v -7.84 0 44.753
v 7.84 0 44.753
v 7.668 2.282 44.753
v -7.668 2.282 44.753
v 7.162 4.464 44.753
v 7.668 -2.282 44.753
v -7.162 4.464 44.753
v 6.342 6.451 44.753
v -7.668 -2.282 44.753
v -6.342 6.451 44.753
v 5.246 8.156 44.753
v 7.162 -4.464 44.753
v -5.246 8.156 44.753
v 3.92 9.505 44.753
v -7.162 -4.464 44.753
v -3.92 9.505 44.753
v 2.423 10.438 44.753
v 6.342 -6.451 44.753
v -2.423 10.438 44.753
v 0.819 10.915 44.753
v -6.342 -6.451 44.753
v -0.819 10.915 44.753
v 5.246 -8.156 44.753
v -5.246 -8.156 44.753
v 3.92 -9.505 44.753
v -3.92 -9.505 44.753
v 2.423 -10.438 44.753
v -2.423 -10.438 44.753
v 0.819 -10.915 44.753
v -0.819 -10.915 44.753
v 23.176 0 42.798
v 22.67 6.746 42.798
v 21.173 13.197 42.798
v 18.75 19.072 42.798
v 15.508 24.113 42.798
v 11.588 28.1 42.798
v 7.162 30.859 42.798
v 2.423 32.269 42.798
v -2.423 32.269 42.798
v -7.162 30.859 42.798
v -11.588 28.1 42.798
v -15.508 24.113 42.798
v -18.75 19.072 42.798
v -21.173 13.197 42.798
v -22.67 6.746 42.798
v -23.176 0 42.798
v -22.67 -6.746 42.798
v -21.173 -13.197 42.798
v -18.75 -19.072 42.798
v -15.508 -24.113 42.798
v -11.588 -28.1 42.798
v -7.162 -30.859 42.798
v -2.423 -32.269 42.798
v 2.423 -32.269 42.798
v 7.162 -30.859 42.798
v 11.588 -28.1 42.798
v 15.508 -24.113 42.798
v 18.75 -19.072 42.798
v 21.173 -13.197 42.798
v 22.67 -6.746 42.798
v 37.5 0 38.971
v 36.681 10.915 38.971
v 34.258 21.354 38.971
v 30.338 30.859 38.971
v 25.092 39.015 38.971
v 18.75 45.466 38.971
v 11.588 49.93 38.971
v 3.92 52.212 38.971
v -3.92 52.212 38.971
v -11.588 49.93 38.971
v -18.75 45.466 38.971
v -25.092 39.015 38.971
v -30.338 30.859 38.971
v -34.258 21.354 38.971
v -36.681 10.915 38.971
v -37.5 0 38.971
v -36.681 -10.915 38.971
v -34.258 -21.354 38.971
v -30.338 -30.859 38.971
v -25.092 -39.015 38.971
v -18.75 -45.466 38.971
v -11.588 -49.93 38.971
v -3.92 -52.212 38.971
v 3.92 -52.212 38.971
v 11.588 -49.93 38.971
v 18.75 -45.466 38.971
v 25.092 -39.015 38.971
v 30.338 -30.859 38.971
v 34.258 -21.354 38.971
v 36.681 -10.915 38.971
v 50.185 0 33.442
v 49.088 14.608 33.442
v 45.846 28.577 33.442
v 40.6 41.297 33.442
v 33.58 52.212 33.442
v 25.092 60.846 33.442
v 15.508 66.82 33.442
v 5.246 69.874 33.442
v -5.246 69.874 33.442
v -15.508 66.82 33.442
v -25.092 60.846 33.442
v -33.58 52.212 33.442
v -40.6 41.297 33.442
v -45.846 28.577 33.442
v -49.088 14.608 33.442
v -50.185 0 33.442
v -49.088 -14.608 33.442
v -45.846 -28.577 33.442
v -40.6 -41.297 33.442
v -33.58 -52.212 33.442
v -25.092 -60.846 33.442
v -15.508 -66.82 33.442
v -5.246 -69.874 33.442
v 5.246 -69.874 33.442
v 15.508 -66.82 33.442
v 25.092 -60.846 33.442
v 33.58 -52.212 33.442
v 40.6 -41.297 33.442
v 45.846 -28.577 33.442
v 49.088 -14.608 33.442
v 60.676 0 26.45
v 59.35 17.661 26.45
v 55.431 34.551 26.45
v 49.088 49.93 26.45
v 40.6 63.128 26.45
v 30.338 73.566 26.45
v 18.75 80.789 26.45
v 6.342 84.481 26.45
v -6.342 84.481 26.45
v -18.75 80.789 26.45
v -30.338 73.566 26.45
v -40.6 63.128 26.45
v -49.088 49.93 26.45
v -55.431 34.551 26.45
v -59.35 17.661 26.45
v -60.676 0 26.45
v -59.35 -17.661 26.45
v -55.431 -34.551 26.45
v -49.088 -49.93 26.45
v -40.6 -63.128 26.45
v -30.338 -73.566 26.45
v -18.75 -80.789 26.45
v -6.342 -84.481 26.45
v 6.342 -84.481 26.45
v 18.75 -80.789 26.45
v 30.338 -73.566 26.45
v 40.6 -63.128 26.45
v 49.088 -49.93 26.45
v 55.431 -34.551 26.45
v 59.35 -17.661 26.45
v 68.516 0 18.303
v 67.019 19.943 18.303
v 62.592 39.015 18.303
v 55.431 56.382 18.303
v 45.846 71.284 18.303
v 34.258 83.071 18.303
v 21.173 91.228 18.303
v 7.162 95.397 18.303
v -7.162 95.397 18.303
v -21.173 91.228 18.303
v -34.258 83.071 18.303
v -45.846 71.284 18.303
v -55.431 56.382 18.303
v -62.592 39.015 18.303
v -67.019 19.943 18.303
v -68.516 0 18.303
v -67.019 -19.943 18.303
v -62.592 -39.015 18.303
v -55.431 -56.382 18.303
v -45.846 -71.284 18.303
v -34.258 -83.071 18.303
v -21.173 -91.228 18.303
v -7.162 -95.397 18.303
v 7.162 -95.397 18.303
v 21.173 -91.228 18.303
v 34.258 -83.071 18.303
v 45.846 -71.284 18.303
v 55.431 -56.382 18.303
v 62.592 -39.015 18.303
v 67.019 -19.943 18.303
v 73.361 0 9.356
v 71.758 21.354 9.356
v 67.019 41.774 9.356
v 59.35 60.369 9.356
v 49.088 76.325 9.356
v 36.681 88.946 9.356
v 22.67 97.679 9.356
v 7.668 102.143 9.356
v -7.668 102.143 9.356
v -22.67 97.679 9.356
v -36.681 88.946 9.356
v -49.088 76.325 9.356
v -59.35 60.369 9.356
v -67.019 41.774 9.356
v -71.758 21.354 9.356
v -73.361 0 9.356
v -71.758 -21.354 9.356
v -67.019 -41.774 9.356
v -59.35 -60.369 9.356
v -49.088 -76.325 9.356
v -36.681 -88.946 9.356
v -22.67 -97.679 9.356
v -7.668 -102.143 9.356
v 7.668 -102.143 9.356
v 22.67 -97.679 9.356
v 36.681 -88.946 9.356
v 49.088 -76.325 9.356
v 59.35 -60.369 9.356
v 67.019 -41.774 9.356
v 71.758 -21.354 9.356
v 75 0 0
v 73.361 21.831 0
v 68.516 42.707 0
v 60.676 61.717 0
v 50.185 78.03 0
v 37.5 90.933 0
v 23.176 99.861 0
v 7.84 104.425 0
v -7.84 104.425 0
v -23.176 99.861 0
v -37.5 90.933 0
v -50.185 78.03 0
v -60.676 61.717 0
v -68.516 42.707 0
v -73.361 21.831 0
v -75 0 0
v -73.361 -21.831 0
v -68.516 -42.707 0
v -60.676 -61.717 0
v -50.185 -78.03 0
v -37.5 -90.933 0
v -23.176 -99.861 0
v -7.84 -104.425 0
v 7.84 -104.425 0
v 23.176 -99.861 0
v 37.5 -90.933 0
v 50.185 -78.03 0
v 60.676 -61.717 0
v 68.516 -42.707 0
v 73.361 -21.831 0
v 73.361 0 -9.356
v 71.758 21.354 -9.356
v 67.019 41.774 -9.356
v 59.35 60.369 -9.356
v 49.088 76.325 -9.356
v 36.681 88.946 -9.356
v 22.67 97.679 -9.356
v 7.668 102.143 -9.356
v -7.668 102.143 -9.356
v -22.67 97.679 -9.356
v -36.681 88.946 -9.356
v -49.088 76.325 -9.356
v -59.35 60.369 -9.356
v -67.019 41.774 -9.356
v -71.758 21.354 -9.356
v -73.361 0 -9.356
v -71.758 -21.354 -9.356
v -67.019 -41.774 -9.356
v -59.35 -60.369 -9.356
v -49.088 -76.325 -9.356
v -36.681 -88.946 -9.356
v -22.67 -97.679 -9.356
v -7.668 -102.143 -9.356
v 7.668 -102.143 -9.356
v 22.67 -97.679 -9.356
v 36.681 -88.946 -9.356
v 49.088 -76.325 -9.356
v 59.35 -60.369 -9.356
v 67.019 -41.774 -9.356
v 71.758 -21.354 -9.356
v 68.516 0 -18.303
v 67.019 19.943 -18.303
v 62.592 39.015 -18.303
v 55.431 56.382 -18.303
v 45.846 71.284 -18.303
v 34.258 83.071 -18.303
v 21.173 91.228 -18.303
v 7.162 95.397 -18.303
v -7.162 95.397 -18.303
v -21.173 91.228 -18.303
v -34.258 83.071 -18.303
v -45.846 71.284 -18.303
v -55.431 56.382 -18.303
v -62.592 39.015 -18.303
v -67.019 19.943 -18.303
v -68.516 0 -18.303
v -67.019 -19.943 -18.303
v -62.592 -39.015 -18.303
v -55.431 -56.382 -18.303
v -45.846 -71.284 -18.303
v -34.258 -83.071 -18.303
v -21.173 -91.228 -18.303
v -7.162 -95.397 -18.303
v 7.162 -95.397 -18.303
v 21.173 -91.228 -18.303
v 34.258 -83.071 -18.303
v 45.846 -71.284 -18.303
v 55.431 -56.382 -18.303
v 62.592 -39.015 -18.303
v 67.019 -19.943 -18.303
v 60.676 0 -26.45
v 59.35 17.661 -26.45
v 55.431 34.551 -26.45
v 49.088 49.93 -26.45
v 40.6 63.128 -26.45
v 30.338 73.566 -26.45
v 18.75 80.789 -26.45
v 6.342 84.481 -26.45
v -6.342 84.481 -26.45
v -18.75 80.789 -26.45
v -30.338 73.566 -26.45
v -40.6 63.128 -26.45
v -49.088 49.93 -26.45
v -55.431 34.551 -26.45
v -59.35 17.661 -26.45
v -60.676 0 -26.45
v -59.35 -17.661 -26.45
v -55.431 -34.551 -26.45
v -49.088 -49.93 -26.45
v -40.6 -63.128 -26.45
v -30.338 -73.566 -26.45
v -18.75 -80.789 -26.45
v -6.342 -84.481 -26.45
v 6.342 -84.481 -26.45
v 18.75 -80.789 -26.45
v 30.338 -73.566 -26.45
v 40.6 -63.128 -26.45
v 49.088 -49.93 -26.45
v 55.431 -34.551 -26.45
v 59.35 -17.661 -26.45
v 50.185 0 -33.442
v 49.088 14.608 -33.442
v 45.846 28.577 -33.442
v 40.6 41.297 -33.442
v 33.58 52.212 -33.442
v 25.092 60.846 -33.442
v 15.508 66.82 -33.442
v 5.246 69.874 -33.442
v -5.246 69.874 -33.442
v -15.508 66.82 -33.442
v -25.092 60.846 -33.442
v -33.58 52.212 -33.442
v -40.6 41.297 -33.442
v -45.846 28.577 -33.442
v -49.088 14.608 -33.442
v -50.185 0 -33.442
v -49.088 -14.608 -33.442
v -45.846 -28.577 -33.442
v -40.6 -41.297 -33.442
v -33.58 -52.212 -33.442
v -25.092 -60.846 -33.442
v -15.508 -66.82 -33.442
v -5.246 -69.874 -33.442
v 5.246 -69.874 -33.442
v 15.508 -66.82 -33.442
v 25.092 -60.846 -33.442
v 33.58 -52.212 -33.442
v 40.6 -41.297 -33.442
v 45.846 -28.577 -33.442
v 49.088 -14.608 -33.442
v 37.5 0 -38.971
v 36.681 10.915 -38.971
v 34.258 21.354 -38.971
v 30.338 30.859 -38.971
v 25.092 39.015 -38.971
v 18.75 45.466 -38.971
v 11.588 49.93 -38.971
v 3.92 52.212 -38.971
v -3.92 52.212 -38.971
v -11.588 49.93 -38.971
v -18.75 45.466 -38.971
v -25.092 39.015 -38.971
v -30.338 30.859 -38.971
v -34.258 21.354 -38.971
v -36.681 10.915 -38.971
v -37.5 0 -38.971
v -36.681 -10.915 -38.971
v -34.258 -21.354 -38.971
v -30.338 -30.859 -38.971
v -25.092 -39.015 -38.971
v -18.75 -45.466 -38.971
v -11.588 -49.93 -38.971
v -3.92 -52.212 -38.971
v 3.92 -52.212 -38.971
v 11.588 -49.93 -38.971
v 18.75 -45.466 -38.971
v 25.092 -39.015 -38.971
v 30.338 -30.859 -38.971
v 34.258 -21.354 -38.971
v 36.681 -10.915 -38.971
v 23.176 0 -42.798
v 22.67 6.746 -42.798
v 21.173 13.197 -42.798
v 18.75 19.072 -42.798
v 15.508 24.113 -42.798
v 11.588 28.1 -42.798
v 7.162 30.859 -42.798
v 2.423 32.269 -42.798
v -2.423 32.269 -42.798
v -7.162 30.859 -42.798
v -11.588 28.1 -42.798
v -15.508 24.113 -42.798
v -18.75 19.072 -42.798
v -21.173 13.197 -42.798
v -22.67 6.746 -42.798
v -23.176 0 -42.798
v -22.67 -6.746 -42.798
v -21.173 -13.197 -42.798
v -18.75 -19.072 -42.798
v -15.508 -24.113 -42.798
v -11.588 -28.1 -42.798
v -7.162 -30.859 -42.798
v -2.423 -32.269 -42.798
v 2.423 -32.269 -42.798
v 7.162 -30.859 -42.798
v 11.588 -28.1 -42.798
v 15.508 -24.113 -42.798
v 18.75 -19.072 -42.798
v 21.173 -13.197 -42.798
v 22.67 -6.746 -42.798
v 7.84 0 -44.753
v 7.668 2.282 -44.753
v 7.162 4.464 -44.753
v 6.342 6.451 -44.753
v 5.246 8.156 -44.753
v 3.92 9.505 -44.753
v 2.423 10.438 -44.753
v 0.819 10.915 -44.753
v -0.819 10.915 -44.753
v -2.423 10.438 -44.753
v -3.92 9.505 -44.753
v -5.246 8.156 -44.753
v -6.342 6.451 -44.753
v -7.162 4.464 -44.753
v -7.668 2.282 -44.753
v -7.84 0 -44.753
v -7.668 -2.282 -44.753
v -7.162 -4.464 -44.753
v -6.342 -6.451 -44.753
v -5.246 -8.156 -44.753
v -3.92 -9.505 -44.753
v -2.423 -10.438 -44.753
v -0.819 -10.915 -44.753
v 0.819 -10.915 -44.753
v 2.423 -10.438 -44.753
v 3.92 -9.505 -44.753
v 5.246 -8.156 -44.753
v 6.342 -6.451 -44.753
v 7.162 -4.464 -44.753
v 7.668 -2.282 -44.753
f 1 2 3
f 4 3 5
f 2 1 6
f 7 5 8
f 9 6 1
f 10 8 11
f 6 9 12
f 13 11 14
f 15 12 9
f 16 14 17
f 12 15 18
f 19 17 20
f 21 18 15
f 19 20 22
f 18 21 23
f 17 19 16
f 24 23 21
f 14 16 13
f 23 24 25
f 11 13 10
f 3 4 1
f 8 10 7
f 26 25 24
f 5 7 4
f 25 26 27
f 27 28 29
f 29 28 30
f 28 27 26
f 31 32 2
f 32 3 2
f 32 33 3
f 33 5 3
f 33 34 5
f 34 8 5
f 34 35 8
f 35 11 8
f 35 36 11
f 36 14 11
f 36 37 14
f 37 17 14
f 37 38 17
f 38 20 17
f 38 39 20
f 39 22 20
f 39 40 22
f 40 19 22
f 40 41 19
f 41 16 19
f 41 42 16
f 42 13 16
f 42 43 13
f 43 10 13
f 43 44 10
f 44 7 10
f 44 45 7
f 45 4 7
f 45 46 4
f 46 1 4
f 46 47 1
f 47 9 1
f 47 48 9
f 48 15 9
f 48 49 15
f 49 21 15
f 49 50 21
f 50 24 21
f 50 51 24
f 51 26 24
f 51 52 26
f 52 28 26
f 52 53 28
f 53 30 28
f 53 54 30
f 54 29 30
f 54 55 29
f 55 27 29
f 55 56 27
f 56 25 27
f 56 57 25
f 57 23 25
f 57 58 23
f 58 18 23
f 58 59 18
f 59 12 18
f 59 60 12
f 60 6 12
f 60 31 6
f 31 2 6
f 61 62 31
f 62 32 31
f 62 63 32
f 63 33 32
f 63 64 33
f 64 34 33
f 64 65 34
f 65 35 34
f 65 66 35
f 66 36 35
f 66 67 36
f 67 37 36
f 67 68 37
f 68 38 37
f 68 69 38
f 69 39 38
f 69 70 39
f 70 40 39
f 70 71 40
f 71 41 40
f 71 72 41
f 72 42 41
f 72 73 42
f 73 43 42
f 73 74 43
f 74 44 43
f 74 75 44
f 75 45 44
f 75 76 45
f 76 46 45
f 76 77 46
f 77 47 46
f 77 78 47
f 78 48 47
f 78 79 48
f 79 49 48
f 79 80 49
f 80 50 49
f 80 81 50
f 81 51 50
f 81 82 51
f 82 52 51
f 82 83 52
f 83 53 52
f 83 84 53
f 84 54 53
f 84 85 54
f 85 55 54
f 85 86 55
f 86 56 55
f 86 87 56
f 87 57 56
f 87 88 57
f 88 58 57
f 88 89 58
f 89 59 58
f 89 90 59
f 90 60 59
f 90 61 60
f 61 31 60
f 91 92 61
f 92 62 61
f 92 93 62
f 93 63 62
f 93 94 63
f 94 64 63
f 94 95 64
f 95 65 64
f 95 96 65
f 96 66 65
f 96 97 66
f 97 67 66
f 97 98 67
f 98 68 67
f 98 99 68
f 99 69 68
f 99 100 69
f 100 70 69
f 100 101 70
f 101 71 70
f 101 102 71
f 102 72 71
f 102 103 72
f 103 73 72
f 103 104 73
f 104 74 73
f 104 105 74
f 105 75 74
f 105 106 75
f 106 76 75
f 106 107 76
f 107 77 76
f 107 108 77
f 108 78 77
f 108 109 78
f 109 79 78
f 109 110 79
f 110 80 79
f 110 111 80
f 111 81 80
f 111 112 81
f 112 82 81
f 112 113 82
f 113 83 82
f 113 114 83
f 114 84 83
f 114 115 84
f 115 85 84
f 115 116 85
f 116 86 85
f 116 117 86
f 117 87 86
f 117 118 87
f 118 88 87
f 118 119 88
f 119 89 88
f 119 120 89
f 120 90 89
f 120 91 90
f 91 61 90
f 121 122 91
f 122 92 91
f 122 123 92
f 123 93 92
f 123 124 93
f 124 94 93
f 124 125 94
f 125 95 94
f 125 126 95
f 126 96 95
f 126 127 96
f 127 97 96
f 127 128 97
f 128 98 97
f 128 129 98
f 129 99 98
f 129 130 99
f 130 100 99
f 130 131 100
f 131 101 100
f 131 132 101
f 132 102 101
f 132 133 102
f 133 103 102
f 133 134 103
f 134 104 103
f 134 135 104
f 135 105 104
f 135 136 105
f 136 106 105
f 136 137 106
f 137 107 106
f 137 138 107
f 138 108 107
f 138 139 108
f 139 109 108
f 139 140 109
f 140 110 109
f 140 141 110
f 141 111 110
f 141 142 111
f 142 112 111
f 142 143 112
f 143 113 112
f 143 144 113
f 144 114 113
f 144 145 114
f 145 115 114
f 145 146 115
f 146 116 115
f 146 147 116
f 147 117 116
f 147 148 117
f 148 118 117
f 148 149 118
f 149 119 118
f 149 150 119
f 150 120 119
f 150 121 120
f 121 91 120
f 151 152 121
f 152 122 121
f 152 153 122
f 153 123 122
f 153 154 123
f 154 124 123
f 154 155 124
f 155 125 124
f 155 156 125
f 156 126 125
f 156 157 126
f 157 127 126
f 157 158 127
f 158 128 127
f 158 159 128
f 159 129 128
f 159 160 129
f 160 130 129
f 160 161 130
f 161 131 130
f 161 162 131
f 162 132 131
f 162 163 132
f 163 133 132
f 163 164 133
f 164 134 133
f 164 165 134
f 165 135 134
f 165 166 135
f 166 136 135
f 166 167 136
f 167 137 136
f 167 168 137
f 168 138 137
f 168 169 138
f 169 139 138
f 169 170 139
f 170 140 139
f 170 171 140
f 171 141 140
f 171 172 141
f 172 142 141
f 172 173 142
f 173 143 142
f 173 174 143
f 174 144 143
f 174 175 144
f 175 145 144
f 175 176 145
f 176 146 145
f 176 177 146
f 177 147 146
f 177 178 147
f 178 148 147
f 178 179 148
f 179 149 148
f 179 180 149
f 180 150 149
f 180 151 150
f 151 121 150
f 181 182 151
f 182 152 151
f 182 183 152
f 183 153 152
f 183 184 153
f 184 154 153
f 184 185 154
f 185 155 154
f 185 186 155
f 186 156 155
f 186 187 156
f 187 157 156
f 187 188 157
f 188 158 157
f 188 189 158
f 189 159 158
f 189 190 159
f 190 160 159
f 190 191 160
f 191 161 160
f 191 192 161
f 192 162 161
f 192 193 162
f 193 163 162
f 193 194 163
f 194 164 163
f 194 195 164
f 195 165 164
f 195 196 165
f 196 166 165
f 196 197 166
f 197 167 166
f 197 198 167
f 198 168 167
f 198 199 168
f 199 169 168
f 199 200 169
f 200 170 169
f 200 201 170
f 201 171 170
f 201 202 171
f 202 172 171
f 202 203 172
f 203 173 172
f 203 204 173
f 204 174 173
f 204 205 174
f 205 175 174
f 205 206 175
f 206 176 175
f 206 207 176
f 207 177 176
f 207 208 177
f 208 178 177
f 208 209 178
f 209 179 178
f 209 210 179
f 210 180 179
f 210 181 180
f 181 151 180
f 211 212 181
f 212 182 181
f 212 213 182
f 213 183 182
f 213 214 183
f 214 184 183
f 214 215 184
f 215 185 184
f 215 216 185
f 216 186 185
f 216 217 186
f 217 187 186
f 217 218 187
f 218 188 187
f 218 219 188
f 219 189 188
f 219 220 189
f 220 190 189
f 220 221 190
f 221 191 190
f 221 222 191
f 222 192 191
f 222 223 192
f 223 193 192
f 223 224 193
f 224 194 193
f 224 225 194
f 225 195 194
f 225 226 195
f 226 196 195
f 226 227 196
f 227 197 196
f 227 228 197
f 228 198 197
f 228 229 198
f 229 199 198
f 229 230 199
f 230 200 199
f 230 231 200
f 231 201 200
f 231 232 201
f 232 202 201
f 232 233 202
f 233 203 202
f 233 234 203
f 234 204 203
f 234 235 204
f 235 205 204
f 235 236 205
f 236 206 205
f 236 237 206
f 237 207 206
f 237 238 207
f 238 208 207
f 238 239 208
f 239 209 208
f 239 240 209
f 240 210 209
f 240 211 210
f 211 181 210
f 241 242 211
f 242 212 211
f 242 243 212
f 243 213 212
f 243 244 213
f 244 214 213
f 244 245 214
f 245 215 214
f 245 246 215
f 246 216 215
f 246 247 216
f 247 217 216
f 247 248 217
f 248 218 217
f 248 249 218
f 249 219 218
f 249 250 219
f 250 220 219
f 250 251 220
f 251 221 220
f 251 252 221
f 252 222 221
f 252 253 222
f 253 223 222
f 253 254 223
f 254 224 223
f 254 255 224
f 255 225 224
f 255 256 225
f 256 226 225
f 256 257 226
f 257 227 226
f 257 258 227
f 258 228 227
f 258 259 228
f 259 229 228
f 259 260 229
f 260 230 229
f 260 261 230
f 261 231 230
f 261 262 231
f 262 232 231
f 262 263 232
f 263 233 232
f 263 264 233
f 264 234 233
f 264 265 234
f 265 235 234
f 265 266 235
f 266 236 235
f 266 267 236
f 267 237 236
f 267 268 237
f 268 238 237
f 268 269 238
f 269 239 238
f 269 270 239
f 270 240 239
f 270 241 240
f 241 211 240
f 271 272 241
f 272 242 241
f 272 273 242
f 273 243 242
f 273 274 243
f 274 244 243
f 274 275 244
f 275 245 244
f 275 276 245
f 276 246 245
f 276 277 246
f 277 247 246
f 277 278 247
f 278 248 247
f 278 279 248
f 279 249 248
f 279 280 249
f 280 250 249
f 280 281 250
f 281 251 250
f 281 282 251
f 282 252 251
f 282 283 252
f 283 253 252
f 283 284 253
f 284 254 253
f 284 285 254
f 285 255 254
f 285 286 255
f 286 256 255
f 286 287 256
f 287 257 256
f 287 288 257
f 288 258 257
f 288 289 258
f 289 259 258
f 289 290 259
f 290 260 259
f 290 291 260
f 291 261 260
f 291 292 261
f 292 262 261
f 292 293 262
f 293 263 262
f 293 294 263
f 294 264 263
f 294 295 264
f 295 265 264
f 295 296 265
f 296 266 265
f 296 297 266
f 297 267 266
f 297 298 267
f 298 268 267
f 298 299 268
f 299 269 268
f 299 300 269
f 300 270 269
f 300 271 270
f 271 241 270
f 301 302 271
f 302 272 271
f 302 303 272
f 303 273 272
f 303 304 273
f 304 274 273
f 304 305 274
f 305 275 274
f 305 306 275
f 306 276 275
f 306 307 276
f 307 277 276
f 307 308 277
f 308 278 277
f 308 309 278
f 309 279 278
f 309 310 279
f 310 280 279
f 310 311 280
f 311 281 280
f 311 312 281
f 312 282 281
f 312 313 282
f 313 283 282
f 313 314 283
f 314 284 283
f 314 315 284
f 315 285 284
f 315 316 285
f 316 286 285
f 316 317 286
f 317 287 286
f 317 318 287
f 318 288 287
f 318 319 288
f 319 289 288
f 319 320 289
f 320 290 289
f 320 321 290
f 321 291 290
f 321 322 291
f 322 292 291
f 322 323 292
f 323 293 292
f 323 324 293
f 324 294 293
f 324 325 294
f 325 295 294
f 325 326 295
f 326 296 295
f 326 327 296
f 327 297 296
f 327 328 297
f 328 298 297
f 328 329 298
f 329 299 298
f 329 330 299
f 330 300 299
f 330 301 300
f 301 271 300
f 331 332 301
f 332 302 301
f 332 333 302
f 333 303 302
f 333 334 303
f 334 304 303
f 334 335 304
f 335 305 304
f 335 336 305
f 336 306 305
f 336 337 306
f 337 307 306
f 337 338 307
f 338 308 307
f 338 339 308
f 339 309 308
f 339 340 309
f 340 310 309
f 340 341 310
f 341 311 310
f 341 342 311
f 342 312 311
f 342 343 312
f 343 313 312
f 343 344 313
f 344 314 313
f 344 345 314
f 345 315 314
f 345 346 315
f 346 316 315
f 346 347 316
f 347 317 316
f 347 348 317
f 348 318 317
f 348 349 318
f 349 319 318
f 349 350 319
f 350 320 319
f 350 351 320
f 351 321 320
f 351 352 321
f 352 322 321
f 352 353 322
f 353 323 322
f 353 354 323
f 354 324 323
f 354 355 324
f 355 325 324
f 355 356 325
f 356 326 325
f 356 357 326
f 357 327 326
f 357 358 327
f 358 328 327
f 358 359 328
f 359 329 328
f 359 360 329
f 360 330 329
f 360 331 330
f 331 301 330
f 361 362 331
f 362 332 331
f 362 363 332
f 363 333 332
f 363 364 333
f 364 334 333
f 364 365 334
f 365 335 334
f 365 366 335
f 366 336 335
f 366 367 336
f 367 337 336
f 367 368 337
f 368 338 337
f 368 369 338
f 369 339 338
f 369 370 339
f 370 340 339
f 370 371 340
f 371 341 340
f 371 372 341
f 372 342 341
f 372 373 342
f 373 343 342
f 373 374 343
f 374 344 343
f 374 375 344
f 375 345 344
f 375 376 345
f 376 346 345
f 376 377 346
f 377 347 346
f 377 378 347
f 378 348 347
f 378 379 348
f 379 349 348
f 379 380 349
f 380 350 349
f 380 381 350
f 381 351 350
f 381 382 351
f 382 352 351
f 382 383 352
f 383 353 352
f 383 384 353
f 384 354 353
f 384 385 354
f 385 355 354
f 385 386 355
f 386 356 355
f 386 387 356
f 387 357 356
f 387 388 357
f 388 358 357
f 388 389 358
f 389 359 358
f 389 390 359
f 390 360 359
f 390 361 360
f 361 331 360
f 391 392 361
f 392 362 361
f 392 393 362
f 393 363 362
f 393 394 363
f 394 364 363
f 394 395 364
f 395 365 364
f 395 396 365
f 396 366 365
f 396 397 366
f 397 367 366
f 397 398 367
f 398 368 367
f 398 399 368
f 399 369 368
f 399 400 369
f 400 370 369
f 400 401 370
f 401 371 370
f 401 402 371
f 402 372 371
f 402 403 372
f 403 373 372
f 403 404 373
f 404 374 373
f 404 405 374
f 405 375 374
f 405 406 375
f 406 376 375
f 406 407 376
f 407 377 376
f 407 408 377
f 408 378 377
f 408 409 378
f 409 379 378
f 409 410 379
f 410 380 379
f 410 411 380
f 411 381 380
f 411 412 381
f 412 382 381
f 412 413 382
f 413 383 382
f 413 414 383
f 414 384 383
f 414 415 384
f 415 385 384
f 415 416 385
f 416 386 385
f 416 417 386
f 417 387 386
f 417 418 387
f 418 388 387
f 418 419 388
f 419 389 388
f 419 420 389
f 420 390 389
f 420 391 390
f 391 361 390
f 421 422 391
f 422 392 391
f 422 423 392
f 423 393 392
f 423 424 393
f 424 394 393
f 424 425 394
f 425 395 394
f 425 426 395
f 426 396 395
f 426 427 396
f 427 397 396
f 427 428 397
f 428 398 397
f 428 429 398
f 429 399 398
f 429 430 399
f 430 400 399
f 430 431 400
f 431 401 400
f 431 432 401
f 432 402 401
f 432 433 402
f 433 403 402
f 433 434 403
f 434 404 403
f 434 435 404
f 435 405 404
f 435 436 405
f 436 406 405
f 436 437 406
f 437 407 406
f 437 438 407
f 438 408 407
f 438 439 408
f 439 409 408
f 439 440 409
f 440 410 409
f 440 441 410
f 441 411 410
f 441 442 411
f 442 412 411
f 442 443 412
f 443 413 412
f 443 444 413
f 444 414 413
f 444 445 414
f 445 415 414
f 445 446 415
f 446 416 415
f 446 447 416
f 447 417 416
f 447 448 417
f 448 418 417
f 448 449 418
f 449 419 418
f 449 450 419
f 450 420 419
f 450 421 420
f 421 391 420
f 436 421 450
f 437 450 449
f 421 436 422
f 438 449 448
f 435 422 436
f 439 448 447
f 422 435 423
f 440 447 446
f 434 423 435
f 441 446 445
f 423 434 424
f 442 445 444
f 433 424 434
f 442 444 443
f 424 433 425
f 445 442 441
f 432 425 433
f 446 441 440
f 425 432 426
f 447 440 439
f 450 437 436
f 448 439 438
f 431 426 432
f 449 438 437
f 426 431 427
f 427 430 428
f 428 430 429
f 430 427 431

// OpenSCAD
// Generated by SolidPython 1.0.1 on 2020-07-29 00:46:46


scale(v = [5, 7, 3]) {
	sphere(r = 15);
}
/***********************************************
*********      SolidPython code:      **********
************************************************
 
# import packages: SolidPython
from solid import *
from solid.utils import *
from itertools import chain, combinations, permutations


class Resize:

    def __init__(self, scad_file):
        self.scad_file = scad_file
        #self.scad_file = import_scad(scad_file)
        # cone/cylinder param:
        self.r1 = 0
        self.r2 = 0
        self.h = 0
        # rectangular prism param:
        self.w = 0
        self.l = 0
        # ellipse param:
        self.r = 0

    # import OpenScad code (file name corresponds to shape)


    # classify shape + parameters
    def assign(self, param1, param2, param3):
        if self.scad_file == 'cone.scad':
            self.r1 = param1
            self.r2 = param2
            self.h = param3
        elif self.scad_file == 'cylinder.scad':
            self.r1 = param1
            self.r2 = param2
            self.h = param3
        elif self.scad_file == 'rectangularPrism.scad':
            self.h = param1
            self.l = param2
            self.w = param3
        else:
            self.r = param1
            self.h = param2

    # resize parameters
    def iterate(self):
        x = range(3, 20, 2)
        i = 1
        if self.scad_file == 'cone.scad':
            tempList = list(permutations(x, 2))
            for temp in tempList:
                param1 = temp[0]
                param2 = temp[1]
                filepath = 'produced_scad_files/' + 'cone' + str(param1) + '_' + str(param2) + '_' + '.scad'
                scad_render_to_file(cylinder(h=param1, r1=param2, r2=0), filepath)

        elif self.scad_file == 'cylinder.scad':
            tempList = list(permutations(x, 3))
            for temp in tempList:
                param1 = temp[0]
                param2 = temp[1]
                filepath = 'produced_scad_files/' + 'cylinder' + str(param1) + '_' + str(param2) + '_' + '.scad'
                scad_render_to_file(cylinder(h=param1, r1=param2, r2=param2), filepath)

        elif self.scad_file == 'rectangularPrism.scad':
            tempList = list(permutations(x, 3))
            for temp in tempList:
                param1 = temp[0]
                param2 = temp[1]
                param3 = temp[2]
                filepath = 'produced_scad_files/' + 'rectangularPrism' + str(param1) + '_' + str(param2) + '_' + str(
                    param3) + '.scad'
                scad_render_to_file(cube(size=(param1, param2, param3)), filepath)

        elif self.scad_file == 'ellipse.scad':
            tempList = list(permutations(x, 4))
            for temp in tempList:
                param1 = temp[0]
                param2 = temp[1]
                param3 = temp[2]
                param4 = temp[3]
                filepath = 'produced_scad_files/' + 'ellipse' + str(param1) + '_' + str(param2) + '_' + str(param3) + '_' + str(param4) + '.scad'
                scad_render_to_file(scale([param1, param2, param3])(sphere(r=param4)), filepath)

    def render_to_scadfile(self):
        scad_render_to_file(scad, 'example.scad') 
 
************************************************/
